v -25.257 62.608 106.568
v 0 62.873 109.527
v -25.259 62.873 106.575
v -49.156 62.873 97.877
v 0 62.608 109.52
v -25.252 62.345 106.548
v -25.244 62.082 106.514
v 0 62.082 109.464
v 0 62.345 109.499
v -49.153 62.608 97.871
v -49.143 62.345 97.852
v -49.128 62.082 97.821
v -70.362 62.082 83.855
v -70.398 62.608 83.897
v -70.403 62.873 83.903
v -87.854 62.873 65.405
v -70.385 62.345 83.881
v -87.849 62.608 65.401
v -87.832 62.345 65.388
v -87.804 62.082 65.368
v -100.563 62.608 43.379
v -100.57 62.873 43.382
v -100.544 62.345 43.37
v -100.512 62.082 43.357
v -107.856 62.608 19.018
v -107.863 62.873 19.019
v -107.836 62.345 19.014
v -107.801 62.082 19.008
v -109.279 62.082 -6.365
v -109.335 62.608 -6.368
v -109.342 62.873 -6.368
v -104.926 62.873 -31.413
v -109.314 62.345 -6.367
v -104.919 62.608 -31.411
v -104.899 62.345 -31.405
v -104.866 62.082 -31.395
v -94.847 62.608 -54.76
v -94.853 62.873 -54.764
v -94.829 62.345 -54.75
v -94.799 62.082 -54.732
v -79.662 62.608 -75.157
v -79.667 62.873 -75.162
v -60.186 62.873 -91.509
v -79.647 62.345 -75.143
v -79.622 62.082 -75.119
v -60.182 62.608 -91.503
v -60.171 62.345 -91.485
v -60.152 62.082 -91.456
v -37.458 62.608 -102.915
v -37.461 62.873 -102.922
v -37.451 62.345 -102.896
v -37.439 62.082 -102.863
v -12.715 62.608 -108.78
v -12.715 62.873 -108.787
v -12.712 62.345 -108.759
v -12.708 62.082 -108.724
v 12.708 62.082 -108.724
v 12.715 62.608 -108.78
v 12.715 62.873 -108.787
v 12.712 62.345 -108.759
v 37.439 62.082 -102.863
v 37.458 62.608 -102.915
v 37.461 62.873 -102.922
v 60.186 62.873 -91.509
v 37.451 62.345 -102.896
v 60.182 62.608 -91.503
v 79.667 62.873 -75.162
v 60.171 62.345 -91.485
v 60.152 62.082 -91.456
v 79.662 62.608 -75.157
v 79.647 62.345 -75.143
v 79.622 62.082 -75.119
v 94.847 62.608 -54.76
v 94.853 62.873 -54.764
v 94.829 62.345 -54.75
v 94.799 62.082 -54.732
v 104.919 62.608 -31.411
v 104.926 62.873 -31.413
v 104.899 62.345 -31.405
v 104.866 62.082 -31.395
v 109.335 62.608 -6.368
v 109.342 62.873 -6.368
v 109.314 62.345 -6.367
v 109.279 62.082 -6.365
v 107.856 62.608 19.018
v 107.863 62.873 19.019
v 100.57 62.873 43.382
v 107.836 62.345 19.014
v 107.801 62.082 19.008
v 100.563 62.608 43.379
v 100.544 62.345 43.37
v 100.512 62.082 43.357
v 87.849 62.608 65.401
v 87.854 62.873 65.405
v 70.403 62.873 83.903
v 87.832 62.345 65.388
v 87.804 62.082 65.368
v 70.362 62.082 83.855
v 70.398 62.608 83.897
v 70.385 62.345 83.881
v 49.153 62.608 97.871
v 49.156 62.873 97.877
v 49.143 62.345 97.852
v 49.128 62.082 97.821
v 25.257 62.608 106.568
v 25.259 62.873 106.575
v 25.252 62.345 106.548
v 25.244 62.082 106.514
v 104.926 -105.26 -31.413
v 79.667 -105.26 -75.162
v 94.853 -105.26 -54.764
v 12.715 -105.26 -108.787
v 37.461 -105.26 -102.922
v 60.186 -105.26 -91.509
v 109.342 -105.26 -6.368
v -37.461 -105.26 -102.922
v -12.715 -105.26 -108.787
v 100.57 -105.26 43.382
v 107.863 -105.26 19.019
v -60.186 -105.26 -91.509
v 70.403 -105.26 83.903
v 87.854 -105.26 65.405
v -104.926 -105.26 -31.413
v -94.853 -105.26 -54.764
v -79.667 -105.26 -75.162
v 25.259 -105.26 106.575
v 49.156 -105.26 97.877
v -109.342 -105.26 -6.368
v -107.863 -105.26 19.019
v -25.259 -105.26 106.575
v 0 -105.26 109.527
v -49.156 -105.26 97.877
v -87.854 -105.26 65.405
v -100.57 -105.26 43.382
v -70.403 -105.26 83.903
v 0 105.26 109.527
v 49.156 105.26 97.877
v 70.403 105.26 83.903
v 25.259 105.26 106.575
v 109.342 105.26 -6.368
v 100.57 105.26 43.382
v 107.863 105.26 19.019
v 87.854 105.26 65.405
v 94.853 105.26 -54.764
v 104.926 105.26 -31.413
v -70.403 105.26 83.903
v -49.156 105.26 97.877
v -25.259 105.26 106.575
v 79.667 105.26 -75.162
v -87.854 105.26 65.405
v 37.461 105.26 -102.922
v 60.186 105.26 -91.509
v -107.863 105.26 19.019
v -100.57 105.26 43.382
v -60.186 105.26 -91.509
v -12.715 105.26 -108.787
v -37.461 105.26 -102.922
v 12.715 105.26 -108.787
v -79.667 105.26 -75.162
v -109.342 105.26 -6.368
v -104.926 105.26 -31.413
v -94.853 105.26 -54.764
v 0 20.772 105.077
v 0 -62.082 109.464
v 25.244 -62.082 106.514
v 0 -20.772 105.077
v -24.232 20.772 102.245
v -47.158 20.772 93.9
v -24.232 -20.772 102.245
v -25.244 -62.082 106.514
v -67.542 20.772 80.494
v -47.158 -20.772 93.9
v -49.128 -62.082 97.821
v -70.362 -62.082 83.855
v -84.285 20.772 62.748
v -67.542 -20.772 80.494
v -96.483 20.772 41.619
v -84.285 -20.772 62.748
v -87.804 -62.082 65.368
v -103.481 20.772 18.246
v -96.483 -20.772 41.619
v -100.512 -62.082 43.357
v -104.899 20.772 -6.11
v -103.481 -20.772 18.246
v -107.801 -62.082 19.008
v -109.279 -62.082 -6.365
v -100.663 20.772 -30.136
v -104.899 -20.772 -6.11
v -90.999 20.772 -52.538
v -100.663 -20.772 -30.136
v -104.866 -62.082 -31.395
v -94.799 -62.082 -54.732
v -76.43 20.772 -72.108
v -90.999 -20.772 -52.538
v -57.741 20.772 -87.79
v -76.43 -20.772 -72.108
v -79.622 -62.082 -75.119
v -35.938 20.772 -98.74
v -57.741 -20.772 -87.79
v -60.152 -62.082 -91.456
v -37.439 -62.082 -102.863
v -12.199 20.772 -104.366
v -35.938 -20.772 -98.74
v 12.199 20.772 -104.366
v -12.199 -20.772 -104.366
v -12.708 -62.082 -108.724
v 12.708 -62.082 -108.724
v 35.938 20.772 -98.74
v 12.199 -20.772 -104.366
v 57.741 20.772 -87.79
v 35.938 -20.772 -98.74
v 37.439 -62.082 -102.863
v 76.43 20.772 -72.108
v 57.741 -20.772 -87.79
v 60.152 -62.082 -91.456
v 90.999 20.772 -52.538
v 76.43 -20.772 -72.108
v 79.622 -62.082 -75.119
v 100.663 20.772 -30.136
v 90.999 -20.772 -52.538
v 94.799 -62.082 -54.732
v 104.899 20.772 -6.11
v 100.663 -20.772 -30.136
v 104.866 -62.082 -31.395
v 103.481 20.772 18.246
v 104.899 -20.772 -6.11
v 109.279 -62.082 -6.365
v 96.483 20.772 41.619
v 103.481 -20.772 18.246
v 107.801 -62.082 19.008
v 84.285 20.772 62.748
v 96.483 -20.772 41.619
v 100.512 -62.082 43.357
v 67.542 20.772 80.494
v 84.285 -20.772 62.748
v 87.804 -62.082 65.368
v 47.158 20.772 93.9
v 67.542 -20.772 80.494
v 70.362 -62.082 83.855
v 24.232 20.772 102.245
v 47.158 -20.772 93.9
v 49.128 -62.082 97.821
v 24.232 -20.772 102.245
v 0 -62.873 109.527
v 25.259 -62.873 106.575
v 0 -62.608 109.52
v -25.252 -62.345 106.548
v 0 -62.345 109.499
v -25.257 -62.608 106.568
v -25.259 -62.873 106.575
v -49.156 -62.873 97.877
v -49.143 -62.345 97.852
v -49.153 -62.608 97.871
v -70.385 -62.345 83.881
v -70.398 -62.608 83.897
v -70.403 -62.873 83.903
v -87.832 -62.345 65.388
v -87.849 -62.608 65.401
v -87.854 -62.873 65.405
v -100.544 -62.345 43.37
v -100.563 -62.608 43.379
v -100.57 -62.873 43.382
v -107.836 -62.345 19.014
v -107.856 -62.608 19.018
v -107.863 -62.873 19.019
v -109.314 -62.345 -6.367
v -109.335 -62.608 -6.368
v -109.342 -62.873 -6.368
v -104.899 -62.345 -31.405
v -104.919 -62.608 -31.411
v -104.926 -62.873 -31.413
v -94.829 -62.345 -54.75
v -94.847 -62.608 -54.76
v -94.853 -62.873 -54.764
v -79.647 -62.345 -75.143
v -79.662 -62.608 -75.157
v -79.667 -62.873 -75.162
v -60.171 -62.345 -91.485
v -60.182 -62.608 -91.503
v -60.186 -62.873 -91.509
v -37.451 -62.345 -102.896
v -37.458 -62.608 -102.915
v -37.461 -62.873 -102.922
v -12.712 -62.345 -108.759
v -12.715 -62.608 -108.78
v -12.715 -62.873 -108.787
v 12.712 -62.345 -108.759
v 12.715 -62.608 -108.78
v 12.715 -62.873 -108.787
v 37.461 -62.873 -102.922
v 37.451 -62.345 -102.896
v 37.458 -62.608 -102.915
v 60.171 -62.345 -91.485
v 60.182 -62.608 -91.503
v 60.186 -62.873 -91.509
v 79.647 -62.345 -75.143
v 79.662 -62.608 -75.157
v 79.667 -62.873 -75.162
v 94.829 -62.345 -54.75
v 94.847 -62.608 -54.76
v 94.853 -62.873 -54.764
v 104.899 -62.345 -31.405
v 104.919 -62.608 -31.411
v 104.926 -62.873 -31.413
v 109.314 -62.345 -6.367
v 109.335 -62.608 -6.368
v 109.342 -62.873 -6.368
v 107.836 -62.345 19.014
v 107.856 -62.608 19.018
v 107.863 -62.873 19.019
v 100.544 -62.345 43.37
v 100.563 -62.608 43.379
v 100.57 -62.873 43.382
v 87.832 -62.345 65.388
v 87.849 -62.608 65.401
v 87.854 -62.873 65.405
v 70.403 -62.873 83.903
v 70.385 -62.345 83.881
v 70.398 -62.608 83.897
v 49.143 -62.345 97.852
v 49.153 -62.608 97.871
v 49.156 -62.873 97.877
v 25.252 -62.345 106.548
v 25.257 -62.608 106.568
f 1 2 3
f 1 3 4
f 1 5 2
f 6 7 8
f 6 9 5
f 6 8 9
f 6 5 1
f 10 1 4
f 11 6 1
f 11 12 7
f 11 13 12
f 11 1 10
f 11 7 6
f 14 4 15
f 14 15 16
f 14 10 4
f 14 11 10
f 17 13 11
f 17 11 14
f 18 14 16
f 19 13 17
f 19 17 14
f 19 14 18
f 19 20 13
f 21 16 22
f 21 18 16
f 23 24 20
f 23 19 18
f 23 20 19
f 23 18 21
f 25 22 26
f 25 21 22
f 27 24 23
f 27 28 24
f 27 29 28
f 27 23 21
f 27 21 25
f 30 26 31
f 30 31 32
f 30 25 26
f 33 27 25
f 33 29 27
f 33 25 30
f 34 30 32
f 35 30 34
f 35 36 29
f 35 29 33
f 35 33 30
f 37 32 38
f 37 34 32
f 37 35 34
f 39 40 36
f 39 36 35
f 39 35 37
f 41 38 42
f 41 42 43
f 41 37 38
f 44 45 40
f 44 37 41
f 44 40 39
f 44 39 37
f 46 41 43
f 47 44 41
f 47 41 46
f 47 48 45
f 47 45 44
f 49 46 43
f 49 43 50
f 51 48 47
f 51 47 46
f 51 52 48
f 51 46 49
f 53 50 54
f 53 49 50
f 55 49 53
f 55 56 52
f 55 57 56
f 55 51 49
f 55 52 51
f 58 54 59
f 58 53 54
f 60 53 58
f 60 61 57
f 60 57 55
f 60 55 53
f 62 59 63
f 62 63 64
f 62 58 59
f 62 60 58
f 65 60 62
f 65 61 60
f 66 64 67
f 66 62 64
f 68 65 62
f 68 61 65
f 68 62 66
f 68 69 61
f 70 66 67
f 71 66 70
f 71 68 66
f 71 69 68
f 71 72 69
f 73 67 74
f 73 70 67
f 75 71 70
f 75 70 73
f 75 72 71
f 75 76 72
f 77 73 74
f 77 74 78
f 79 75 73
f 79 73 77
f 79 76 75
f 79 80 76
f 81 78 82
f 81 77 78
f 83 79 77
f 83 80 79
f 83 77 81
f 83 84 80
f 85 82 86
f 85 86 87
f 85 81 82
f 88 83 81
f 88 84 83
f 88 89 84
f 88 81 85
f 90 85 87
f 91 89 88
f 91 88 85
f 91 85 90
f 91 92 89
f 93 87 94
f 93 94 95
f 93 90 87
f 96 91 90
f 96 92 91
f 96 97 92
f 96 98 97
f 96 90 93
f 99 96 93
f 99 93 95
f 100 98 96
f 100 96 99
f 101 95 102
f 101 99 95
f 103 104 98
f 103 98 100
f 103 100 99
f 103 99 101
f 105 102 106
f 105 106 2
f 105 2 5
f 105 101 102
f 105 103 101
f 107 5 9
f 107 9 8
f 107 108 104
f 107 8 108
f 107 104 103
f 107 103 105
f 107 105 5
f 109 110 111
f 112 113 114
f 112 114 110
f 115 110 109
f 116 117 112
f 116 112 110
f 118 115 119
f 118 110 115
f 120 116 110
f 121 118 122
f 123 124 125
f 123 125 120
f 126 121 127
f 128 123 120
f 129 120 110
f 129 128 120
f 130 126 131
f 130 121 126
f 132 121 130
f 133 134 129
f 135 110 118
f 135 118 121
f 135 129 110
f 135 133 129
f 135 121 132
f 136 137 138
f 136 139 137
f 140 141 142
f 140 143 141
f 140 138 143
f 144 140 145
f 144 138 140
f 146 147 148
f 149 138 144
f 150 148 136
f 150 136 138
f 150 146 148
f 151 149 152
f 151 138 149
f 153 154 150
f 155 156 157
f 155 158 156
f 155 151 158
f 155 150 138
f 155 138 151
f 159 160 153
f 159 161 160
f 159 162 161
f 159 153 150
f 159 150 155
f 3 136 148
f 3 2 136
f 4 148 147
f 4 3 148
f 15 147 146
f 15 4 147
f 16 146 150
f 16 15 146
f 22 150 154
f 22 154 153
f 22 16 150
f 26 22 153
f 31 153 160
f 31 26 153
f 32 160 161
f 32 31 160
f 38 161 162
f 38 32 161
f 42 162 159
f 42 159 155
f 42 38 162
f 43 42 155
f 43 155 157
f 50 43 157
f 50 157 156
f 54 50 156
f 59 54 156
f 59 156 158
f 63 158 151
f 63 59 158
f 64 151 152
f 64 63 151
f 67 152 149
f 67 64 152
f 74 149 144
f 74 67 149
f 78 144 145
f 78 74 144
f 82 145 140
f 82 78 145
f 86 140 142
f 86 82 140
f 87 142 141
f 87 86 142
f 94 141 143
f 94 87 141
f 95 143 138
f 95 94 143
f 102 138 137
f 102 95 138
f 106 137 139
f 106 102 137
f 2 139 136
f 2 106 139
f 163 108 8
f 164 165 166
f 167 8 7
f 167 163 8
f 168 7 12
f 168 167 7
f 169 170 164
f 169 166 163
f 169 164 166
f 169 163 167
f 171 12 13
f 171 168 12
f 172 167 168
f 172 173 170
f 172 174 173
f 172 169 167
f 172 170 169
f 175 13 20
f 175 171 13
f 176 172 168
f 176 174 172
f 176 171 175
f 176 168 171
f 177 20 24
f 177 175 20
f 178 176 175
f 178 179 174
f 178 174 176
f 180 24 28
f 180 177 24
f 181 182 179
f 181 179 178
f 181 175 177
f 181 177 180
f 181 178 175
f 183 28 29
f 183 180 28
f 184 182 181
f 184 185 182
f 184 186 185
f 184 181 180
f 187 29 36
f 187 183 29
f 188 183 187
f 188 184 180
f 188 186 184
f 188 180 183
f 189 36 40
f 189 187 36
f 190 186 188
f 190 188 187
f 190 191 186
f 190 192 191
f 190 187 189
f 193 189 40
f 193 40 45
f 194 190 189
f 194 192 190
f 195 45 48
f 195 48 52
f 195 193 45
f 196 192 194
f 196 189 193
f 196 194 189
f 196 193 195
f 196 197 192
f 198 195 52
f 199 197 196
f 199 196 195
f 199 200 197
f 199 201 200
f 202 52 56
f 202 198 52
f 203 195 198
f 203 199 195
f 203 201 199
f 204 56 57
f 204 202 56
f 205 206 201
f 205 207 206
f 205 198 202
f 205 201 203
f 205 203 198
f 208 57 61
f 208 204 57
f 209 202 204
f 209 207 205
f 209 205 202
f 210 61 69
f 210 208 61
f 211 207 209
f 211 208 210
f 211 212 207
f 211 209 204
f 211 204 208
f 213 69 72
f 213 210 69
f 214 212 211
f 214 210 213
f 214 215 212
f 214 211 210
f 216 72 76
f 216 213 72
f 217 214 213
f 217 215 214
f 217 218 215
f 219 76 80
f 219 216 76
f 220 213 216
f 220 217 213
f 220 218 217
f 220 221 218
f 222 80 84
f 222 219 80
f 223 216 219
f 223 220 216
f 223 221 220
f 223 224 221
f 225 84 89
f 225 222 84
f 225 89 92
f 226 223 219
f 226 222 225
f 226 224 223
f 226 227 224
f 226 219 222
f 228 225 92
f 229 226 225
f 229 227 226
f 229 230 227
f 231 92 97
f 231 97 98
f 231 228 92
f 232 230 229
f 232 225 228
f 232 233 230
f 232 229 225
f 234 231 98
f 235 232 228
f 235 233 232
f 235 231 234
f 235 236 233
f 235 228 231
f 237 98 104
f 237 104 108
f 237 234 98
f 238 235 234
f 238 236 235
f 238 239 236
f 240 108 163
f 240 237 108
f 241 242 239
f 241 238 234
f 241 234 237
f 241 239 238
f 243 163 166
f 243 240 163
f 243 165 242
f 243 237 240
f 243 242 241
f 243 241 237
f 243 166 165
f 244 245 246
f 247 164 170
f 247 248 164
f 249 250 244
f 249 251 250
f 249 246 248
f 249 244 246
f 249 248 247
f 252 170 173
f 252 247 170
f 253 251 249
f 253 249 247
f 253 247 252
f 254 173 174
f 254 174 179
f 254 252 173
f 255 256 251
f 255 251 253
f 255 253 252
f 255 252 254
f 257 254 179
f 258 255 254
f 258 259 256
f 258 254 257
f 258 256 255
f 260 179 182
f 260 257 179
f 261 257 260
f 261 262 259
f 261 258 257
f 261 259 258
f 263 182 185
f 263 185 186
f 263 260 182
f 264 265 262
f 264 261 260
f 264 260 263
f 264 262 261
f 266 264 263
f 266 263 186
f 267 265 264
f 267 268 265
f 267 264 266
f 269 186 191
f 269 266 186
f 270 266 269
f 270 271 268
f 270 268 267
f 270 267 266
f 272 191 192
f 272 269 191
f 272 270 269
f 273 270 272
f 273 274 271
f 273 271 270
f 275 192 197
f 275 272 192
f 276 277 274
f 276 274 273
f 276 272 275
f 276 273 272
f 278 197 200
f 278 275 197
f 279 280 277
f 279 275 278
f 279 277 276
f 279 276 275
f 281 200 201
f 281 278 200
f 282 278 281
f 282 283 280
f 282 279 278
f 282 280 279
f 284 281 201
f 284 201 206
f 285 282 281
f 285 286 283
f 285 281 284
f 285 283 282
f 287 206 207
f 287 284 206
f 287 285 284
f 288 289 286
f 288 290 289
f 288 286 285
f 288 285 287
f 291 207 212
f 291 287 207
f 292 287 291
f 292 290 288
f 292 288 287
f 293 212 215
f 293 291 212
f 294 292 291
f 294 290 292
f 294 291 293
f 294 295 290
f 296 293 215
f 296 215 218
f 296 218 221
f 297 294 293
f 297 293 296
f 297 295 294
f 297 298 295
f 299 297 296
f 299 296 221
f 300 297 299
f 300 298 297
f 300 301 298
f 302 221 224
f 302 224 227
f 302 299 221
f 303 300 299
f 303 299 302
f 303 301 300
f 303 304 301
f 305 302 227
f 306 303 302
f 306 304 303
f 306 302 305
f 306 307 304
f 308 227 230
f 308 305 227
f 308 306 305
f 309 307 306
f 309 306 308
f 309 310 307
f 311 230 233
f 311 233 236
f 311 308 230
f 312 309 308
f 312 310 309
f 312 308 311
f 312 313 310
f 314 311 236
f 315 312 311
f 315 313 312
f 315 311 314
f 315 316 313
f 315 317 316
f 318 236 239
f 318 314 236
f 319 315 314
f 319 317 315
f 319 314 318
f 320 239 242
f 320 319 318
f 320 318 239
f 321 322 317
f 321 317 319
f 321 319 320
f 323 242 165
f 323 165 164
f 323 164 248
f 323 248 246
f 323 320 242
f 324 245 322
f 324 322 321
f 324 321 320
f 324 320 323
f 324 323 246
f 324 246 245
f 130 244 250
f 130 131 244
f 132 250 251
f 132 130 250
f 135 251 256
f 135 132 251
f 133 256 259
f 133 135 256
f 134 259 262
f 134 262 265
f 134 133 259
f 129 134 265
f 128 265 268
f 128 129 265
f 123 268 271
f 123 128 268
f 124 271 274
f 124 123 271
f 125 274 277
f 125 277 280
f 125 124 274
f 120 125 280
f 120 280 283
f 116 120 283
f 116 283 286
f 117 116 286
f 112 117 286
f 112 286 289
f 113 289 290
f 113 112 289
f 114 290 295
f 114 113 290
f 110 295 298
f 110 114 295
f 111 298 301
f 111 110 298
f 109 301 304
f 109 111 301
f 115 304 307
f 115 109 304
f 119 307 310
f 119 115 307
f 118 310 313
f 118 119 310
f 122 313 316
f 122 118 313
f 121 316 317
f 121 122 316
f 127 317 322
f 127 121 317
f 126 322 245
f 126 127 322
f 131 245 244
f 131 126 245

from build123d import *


with BuildPart() as part:
    # Skizze1 → Rotation1 (revolve)
    with BuildSketch(Plane.XY, mode=Mode.PRIVATE) as rotation1_sk:
        with BuildLine():
            Line((109.527295839, -62.872686635), (109.527295839, -105.259657321))
            Line((109.527295839, -105.259657321), (0, -105.259657321))
            Line((0, -105.259657321), (0, 105.259657321))
            Line((0, 105.259657321), (109.527295839, 105.259657321))
            Line((109.527295839, 105.259657321), (109.527295839, 62.872686635))
            ThreePointArc((109.527295839, 62.872686635), (109.511559563, 62.47630913), (109.464449789, 62.082426628))
            ThreePointArc((109.464449789, 62.082426628), (104.527295839, 0), (109.464449789, -62.082426628))
            ThreePointArc((109.464449789, -62.082426628), (109.511559563, -62.47630913), (109.527295839, -62.872686635))
        make_face()
    revolve(rotation1_sk.sketch.rotate(Axis((0, 105.259657321, 0), (0, -1, 0)), 90), axis=Axis((0, 105.259657321, 0), (0, -1, 0)))  # turned: the seam where the file's is


solid = part.part
